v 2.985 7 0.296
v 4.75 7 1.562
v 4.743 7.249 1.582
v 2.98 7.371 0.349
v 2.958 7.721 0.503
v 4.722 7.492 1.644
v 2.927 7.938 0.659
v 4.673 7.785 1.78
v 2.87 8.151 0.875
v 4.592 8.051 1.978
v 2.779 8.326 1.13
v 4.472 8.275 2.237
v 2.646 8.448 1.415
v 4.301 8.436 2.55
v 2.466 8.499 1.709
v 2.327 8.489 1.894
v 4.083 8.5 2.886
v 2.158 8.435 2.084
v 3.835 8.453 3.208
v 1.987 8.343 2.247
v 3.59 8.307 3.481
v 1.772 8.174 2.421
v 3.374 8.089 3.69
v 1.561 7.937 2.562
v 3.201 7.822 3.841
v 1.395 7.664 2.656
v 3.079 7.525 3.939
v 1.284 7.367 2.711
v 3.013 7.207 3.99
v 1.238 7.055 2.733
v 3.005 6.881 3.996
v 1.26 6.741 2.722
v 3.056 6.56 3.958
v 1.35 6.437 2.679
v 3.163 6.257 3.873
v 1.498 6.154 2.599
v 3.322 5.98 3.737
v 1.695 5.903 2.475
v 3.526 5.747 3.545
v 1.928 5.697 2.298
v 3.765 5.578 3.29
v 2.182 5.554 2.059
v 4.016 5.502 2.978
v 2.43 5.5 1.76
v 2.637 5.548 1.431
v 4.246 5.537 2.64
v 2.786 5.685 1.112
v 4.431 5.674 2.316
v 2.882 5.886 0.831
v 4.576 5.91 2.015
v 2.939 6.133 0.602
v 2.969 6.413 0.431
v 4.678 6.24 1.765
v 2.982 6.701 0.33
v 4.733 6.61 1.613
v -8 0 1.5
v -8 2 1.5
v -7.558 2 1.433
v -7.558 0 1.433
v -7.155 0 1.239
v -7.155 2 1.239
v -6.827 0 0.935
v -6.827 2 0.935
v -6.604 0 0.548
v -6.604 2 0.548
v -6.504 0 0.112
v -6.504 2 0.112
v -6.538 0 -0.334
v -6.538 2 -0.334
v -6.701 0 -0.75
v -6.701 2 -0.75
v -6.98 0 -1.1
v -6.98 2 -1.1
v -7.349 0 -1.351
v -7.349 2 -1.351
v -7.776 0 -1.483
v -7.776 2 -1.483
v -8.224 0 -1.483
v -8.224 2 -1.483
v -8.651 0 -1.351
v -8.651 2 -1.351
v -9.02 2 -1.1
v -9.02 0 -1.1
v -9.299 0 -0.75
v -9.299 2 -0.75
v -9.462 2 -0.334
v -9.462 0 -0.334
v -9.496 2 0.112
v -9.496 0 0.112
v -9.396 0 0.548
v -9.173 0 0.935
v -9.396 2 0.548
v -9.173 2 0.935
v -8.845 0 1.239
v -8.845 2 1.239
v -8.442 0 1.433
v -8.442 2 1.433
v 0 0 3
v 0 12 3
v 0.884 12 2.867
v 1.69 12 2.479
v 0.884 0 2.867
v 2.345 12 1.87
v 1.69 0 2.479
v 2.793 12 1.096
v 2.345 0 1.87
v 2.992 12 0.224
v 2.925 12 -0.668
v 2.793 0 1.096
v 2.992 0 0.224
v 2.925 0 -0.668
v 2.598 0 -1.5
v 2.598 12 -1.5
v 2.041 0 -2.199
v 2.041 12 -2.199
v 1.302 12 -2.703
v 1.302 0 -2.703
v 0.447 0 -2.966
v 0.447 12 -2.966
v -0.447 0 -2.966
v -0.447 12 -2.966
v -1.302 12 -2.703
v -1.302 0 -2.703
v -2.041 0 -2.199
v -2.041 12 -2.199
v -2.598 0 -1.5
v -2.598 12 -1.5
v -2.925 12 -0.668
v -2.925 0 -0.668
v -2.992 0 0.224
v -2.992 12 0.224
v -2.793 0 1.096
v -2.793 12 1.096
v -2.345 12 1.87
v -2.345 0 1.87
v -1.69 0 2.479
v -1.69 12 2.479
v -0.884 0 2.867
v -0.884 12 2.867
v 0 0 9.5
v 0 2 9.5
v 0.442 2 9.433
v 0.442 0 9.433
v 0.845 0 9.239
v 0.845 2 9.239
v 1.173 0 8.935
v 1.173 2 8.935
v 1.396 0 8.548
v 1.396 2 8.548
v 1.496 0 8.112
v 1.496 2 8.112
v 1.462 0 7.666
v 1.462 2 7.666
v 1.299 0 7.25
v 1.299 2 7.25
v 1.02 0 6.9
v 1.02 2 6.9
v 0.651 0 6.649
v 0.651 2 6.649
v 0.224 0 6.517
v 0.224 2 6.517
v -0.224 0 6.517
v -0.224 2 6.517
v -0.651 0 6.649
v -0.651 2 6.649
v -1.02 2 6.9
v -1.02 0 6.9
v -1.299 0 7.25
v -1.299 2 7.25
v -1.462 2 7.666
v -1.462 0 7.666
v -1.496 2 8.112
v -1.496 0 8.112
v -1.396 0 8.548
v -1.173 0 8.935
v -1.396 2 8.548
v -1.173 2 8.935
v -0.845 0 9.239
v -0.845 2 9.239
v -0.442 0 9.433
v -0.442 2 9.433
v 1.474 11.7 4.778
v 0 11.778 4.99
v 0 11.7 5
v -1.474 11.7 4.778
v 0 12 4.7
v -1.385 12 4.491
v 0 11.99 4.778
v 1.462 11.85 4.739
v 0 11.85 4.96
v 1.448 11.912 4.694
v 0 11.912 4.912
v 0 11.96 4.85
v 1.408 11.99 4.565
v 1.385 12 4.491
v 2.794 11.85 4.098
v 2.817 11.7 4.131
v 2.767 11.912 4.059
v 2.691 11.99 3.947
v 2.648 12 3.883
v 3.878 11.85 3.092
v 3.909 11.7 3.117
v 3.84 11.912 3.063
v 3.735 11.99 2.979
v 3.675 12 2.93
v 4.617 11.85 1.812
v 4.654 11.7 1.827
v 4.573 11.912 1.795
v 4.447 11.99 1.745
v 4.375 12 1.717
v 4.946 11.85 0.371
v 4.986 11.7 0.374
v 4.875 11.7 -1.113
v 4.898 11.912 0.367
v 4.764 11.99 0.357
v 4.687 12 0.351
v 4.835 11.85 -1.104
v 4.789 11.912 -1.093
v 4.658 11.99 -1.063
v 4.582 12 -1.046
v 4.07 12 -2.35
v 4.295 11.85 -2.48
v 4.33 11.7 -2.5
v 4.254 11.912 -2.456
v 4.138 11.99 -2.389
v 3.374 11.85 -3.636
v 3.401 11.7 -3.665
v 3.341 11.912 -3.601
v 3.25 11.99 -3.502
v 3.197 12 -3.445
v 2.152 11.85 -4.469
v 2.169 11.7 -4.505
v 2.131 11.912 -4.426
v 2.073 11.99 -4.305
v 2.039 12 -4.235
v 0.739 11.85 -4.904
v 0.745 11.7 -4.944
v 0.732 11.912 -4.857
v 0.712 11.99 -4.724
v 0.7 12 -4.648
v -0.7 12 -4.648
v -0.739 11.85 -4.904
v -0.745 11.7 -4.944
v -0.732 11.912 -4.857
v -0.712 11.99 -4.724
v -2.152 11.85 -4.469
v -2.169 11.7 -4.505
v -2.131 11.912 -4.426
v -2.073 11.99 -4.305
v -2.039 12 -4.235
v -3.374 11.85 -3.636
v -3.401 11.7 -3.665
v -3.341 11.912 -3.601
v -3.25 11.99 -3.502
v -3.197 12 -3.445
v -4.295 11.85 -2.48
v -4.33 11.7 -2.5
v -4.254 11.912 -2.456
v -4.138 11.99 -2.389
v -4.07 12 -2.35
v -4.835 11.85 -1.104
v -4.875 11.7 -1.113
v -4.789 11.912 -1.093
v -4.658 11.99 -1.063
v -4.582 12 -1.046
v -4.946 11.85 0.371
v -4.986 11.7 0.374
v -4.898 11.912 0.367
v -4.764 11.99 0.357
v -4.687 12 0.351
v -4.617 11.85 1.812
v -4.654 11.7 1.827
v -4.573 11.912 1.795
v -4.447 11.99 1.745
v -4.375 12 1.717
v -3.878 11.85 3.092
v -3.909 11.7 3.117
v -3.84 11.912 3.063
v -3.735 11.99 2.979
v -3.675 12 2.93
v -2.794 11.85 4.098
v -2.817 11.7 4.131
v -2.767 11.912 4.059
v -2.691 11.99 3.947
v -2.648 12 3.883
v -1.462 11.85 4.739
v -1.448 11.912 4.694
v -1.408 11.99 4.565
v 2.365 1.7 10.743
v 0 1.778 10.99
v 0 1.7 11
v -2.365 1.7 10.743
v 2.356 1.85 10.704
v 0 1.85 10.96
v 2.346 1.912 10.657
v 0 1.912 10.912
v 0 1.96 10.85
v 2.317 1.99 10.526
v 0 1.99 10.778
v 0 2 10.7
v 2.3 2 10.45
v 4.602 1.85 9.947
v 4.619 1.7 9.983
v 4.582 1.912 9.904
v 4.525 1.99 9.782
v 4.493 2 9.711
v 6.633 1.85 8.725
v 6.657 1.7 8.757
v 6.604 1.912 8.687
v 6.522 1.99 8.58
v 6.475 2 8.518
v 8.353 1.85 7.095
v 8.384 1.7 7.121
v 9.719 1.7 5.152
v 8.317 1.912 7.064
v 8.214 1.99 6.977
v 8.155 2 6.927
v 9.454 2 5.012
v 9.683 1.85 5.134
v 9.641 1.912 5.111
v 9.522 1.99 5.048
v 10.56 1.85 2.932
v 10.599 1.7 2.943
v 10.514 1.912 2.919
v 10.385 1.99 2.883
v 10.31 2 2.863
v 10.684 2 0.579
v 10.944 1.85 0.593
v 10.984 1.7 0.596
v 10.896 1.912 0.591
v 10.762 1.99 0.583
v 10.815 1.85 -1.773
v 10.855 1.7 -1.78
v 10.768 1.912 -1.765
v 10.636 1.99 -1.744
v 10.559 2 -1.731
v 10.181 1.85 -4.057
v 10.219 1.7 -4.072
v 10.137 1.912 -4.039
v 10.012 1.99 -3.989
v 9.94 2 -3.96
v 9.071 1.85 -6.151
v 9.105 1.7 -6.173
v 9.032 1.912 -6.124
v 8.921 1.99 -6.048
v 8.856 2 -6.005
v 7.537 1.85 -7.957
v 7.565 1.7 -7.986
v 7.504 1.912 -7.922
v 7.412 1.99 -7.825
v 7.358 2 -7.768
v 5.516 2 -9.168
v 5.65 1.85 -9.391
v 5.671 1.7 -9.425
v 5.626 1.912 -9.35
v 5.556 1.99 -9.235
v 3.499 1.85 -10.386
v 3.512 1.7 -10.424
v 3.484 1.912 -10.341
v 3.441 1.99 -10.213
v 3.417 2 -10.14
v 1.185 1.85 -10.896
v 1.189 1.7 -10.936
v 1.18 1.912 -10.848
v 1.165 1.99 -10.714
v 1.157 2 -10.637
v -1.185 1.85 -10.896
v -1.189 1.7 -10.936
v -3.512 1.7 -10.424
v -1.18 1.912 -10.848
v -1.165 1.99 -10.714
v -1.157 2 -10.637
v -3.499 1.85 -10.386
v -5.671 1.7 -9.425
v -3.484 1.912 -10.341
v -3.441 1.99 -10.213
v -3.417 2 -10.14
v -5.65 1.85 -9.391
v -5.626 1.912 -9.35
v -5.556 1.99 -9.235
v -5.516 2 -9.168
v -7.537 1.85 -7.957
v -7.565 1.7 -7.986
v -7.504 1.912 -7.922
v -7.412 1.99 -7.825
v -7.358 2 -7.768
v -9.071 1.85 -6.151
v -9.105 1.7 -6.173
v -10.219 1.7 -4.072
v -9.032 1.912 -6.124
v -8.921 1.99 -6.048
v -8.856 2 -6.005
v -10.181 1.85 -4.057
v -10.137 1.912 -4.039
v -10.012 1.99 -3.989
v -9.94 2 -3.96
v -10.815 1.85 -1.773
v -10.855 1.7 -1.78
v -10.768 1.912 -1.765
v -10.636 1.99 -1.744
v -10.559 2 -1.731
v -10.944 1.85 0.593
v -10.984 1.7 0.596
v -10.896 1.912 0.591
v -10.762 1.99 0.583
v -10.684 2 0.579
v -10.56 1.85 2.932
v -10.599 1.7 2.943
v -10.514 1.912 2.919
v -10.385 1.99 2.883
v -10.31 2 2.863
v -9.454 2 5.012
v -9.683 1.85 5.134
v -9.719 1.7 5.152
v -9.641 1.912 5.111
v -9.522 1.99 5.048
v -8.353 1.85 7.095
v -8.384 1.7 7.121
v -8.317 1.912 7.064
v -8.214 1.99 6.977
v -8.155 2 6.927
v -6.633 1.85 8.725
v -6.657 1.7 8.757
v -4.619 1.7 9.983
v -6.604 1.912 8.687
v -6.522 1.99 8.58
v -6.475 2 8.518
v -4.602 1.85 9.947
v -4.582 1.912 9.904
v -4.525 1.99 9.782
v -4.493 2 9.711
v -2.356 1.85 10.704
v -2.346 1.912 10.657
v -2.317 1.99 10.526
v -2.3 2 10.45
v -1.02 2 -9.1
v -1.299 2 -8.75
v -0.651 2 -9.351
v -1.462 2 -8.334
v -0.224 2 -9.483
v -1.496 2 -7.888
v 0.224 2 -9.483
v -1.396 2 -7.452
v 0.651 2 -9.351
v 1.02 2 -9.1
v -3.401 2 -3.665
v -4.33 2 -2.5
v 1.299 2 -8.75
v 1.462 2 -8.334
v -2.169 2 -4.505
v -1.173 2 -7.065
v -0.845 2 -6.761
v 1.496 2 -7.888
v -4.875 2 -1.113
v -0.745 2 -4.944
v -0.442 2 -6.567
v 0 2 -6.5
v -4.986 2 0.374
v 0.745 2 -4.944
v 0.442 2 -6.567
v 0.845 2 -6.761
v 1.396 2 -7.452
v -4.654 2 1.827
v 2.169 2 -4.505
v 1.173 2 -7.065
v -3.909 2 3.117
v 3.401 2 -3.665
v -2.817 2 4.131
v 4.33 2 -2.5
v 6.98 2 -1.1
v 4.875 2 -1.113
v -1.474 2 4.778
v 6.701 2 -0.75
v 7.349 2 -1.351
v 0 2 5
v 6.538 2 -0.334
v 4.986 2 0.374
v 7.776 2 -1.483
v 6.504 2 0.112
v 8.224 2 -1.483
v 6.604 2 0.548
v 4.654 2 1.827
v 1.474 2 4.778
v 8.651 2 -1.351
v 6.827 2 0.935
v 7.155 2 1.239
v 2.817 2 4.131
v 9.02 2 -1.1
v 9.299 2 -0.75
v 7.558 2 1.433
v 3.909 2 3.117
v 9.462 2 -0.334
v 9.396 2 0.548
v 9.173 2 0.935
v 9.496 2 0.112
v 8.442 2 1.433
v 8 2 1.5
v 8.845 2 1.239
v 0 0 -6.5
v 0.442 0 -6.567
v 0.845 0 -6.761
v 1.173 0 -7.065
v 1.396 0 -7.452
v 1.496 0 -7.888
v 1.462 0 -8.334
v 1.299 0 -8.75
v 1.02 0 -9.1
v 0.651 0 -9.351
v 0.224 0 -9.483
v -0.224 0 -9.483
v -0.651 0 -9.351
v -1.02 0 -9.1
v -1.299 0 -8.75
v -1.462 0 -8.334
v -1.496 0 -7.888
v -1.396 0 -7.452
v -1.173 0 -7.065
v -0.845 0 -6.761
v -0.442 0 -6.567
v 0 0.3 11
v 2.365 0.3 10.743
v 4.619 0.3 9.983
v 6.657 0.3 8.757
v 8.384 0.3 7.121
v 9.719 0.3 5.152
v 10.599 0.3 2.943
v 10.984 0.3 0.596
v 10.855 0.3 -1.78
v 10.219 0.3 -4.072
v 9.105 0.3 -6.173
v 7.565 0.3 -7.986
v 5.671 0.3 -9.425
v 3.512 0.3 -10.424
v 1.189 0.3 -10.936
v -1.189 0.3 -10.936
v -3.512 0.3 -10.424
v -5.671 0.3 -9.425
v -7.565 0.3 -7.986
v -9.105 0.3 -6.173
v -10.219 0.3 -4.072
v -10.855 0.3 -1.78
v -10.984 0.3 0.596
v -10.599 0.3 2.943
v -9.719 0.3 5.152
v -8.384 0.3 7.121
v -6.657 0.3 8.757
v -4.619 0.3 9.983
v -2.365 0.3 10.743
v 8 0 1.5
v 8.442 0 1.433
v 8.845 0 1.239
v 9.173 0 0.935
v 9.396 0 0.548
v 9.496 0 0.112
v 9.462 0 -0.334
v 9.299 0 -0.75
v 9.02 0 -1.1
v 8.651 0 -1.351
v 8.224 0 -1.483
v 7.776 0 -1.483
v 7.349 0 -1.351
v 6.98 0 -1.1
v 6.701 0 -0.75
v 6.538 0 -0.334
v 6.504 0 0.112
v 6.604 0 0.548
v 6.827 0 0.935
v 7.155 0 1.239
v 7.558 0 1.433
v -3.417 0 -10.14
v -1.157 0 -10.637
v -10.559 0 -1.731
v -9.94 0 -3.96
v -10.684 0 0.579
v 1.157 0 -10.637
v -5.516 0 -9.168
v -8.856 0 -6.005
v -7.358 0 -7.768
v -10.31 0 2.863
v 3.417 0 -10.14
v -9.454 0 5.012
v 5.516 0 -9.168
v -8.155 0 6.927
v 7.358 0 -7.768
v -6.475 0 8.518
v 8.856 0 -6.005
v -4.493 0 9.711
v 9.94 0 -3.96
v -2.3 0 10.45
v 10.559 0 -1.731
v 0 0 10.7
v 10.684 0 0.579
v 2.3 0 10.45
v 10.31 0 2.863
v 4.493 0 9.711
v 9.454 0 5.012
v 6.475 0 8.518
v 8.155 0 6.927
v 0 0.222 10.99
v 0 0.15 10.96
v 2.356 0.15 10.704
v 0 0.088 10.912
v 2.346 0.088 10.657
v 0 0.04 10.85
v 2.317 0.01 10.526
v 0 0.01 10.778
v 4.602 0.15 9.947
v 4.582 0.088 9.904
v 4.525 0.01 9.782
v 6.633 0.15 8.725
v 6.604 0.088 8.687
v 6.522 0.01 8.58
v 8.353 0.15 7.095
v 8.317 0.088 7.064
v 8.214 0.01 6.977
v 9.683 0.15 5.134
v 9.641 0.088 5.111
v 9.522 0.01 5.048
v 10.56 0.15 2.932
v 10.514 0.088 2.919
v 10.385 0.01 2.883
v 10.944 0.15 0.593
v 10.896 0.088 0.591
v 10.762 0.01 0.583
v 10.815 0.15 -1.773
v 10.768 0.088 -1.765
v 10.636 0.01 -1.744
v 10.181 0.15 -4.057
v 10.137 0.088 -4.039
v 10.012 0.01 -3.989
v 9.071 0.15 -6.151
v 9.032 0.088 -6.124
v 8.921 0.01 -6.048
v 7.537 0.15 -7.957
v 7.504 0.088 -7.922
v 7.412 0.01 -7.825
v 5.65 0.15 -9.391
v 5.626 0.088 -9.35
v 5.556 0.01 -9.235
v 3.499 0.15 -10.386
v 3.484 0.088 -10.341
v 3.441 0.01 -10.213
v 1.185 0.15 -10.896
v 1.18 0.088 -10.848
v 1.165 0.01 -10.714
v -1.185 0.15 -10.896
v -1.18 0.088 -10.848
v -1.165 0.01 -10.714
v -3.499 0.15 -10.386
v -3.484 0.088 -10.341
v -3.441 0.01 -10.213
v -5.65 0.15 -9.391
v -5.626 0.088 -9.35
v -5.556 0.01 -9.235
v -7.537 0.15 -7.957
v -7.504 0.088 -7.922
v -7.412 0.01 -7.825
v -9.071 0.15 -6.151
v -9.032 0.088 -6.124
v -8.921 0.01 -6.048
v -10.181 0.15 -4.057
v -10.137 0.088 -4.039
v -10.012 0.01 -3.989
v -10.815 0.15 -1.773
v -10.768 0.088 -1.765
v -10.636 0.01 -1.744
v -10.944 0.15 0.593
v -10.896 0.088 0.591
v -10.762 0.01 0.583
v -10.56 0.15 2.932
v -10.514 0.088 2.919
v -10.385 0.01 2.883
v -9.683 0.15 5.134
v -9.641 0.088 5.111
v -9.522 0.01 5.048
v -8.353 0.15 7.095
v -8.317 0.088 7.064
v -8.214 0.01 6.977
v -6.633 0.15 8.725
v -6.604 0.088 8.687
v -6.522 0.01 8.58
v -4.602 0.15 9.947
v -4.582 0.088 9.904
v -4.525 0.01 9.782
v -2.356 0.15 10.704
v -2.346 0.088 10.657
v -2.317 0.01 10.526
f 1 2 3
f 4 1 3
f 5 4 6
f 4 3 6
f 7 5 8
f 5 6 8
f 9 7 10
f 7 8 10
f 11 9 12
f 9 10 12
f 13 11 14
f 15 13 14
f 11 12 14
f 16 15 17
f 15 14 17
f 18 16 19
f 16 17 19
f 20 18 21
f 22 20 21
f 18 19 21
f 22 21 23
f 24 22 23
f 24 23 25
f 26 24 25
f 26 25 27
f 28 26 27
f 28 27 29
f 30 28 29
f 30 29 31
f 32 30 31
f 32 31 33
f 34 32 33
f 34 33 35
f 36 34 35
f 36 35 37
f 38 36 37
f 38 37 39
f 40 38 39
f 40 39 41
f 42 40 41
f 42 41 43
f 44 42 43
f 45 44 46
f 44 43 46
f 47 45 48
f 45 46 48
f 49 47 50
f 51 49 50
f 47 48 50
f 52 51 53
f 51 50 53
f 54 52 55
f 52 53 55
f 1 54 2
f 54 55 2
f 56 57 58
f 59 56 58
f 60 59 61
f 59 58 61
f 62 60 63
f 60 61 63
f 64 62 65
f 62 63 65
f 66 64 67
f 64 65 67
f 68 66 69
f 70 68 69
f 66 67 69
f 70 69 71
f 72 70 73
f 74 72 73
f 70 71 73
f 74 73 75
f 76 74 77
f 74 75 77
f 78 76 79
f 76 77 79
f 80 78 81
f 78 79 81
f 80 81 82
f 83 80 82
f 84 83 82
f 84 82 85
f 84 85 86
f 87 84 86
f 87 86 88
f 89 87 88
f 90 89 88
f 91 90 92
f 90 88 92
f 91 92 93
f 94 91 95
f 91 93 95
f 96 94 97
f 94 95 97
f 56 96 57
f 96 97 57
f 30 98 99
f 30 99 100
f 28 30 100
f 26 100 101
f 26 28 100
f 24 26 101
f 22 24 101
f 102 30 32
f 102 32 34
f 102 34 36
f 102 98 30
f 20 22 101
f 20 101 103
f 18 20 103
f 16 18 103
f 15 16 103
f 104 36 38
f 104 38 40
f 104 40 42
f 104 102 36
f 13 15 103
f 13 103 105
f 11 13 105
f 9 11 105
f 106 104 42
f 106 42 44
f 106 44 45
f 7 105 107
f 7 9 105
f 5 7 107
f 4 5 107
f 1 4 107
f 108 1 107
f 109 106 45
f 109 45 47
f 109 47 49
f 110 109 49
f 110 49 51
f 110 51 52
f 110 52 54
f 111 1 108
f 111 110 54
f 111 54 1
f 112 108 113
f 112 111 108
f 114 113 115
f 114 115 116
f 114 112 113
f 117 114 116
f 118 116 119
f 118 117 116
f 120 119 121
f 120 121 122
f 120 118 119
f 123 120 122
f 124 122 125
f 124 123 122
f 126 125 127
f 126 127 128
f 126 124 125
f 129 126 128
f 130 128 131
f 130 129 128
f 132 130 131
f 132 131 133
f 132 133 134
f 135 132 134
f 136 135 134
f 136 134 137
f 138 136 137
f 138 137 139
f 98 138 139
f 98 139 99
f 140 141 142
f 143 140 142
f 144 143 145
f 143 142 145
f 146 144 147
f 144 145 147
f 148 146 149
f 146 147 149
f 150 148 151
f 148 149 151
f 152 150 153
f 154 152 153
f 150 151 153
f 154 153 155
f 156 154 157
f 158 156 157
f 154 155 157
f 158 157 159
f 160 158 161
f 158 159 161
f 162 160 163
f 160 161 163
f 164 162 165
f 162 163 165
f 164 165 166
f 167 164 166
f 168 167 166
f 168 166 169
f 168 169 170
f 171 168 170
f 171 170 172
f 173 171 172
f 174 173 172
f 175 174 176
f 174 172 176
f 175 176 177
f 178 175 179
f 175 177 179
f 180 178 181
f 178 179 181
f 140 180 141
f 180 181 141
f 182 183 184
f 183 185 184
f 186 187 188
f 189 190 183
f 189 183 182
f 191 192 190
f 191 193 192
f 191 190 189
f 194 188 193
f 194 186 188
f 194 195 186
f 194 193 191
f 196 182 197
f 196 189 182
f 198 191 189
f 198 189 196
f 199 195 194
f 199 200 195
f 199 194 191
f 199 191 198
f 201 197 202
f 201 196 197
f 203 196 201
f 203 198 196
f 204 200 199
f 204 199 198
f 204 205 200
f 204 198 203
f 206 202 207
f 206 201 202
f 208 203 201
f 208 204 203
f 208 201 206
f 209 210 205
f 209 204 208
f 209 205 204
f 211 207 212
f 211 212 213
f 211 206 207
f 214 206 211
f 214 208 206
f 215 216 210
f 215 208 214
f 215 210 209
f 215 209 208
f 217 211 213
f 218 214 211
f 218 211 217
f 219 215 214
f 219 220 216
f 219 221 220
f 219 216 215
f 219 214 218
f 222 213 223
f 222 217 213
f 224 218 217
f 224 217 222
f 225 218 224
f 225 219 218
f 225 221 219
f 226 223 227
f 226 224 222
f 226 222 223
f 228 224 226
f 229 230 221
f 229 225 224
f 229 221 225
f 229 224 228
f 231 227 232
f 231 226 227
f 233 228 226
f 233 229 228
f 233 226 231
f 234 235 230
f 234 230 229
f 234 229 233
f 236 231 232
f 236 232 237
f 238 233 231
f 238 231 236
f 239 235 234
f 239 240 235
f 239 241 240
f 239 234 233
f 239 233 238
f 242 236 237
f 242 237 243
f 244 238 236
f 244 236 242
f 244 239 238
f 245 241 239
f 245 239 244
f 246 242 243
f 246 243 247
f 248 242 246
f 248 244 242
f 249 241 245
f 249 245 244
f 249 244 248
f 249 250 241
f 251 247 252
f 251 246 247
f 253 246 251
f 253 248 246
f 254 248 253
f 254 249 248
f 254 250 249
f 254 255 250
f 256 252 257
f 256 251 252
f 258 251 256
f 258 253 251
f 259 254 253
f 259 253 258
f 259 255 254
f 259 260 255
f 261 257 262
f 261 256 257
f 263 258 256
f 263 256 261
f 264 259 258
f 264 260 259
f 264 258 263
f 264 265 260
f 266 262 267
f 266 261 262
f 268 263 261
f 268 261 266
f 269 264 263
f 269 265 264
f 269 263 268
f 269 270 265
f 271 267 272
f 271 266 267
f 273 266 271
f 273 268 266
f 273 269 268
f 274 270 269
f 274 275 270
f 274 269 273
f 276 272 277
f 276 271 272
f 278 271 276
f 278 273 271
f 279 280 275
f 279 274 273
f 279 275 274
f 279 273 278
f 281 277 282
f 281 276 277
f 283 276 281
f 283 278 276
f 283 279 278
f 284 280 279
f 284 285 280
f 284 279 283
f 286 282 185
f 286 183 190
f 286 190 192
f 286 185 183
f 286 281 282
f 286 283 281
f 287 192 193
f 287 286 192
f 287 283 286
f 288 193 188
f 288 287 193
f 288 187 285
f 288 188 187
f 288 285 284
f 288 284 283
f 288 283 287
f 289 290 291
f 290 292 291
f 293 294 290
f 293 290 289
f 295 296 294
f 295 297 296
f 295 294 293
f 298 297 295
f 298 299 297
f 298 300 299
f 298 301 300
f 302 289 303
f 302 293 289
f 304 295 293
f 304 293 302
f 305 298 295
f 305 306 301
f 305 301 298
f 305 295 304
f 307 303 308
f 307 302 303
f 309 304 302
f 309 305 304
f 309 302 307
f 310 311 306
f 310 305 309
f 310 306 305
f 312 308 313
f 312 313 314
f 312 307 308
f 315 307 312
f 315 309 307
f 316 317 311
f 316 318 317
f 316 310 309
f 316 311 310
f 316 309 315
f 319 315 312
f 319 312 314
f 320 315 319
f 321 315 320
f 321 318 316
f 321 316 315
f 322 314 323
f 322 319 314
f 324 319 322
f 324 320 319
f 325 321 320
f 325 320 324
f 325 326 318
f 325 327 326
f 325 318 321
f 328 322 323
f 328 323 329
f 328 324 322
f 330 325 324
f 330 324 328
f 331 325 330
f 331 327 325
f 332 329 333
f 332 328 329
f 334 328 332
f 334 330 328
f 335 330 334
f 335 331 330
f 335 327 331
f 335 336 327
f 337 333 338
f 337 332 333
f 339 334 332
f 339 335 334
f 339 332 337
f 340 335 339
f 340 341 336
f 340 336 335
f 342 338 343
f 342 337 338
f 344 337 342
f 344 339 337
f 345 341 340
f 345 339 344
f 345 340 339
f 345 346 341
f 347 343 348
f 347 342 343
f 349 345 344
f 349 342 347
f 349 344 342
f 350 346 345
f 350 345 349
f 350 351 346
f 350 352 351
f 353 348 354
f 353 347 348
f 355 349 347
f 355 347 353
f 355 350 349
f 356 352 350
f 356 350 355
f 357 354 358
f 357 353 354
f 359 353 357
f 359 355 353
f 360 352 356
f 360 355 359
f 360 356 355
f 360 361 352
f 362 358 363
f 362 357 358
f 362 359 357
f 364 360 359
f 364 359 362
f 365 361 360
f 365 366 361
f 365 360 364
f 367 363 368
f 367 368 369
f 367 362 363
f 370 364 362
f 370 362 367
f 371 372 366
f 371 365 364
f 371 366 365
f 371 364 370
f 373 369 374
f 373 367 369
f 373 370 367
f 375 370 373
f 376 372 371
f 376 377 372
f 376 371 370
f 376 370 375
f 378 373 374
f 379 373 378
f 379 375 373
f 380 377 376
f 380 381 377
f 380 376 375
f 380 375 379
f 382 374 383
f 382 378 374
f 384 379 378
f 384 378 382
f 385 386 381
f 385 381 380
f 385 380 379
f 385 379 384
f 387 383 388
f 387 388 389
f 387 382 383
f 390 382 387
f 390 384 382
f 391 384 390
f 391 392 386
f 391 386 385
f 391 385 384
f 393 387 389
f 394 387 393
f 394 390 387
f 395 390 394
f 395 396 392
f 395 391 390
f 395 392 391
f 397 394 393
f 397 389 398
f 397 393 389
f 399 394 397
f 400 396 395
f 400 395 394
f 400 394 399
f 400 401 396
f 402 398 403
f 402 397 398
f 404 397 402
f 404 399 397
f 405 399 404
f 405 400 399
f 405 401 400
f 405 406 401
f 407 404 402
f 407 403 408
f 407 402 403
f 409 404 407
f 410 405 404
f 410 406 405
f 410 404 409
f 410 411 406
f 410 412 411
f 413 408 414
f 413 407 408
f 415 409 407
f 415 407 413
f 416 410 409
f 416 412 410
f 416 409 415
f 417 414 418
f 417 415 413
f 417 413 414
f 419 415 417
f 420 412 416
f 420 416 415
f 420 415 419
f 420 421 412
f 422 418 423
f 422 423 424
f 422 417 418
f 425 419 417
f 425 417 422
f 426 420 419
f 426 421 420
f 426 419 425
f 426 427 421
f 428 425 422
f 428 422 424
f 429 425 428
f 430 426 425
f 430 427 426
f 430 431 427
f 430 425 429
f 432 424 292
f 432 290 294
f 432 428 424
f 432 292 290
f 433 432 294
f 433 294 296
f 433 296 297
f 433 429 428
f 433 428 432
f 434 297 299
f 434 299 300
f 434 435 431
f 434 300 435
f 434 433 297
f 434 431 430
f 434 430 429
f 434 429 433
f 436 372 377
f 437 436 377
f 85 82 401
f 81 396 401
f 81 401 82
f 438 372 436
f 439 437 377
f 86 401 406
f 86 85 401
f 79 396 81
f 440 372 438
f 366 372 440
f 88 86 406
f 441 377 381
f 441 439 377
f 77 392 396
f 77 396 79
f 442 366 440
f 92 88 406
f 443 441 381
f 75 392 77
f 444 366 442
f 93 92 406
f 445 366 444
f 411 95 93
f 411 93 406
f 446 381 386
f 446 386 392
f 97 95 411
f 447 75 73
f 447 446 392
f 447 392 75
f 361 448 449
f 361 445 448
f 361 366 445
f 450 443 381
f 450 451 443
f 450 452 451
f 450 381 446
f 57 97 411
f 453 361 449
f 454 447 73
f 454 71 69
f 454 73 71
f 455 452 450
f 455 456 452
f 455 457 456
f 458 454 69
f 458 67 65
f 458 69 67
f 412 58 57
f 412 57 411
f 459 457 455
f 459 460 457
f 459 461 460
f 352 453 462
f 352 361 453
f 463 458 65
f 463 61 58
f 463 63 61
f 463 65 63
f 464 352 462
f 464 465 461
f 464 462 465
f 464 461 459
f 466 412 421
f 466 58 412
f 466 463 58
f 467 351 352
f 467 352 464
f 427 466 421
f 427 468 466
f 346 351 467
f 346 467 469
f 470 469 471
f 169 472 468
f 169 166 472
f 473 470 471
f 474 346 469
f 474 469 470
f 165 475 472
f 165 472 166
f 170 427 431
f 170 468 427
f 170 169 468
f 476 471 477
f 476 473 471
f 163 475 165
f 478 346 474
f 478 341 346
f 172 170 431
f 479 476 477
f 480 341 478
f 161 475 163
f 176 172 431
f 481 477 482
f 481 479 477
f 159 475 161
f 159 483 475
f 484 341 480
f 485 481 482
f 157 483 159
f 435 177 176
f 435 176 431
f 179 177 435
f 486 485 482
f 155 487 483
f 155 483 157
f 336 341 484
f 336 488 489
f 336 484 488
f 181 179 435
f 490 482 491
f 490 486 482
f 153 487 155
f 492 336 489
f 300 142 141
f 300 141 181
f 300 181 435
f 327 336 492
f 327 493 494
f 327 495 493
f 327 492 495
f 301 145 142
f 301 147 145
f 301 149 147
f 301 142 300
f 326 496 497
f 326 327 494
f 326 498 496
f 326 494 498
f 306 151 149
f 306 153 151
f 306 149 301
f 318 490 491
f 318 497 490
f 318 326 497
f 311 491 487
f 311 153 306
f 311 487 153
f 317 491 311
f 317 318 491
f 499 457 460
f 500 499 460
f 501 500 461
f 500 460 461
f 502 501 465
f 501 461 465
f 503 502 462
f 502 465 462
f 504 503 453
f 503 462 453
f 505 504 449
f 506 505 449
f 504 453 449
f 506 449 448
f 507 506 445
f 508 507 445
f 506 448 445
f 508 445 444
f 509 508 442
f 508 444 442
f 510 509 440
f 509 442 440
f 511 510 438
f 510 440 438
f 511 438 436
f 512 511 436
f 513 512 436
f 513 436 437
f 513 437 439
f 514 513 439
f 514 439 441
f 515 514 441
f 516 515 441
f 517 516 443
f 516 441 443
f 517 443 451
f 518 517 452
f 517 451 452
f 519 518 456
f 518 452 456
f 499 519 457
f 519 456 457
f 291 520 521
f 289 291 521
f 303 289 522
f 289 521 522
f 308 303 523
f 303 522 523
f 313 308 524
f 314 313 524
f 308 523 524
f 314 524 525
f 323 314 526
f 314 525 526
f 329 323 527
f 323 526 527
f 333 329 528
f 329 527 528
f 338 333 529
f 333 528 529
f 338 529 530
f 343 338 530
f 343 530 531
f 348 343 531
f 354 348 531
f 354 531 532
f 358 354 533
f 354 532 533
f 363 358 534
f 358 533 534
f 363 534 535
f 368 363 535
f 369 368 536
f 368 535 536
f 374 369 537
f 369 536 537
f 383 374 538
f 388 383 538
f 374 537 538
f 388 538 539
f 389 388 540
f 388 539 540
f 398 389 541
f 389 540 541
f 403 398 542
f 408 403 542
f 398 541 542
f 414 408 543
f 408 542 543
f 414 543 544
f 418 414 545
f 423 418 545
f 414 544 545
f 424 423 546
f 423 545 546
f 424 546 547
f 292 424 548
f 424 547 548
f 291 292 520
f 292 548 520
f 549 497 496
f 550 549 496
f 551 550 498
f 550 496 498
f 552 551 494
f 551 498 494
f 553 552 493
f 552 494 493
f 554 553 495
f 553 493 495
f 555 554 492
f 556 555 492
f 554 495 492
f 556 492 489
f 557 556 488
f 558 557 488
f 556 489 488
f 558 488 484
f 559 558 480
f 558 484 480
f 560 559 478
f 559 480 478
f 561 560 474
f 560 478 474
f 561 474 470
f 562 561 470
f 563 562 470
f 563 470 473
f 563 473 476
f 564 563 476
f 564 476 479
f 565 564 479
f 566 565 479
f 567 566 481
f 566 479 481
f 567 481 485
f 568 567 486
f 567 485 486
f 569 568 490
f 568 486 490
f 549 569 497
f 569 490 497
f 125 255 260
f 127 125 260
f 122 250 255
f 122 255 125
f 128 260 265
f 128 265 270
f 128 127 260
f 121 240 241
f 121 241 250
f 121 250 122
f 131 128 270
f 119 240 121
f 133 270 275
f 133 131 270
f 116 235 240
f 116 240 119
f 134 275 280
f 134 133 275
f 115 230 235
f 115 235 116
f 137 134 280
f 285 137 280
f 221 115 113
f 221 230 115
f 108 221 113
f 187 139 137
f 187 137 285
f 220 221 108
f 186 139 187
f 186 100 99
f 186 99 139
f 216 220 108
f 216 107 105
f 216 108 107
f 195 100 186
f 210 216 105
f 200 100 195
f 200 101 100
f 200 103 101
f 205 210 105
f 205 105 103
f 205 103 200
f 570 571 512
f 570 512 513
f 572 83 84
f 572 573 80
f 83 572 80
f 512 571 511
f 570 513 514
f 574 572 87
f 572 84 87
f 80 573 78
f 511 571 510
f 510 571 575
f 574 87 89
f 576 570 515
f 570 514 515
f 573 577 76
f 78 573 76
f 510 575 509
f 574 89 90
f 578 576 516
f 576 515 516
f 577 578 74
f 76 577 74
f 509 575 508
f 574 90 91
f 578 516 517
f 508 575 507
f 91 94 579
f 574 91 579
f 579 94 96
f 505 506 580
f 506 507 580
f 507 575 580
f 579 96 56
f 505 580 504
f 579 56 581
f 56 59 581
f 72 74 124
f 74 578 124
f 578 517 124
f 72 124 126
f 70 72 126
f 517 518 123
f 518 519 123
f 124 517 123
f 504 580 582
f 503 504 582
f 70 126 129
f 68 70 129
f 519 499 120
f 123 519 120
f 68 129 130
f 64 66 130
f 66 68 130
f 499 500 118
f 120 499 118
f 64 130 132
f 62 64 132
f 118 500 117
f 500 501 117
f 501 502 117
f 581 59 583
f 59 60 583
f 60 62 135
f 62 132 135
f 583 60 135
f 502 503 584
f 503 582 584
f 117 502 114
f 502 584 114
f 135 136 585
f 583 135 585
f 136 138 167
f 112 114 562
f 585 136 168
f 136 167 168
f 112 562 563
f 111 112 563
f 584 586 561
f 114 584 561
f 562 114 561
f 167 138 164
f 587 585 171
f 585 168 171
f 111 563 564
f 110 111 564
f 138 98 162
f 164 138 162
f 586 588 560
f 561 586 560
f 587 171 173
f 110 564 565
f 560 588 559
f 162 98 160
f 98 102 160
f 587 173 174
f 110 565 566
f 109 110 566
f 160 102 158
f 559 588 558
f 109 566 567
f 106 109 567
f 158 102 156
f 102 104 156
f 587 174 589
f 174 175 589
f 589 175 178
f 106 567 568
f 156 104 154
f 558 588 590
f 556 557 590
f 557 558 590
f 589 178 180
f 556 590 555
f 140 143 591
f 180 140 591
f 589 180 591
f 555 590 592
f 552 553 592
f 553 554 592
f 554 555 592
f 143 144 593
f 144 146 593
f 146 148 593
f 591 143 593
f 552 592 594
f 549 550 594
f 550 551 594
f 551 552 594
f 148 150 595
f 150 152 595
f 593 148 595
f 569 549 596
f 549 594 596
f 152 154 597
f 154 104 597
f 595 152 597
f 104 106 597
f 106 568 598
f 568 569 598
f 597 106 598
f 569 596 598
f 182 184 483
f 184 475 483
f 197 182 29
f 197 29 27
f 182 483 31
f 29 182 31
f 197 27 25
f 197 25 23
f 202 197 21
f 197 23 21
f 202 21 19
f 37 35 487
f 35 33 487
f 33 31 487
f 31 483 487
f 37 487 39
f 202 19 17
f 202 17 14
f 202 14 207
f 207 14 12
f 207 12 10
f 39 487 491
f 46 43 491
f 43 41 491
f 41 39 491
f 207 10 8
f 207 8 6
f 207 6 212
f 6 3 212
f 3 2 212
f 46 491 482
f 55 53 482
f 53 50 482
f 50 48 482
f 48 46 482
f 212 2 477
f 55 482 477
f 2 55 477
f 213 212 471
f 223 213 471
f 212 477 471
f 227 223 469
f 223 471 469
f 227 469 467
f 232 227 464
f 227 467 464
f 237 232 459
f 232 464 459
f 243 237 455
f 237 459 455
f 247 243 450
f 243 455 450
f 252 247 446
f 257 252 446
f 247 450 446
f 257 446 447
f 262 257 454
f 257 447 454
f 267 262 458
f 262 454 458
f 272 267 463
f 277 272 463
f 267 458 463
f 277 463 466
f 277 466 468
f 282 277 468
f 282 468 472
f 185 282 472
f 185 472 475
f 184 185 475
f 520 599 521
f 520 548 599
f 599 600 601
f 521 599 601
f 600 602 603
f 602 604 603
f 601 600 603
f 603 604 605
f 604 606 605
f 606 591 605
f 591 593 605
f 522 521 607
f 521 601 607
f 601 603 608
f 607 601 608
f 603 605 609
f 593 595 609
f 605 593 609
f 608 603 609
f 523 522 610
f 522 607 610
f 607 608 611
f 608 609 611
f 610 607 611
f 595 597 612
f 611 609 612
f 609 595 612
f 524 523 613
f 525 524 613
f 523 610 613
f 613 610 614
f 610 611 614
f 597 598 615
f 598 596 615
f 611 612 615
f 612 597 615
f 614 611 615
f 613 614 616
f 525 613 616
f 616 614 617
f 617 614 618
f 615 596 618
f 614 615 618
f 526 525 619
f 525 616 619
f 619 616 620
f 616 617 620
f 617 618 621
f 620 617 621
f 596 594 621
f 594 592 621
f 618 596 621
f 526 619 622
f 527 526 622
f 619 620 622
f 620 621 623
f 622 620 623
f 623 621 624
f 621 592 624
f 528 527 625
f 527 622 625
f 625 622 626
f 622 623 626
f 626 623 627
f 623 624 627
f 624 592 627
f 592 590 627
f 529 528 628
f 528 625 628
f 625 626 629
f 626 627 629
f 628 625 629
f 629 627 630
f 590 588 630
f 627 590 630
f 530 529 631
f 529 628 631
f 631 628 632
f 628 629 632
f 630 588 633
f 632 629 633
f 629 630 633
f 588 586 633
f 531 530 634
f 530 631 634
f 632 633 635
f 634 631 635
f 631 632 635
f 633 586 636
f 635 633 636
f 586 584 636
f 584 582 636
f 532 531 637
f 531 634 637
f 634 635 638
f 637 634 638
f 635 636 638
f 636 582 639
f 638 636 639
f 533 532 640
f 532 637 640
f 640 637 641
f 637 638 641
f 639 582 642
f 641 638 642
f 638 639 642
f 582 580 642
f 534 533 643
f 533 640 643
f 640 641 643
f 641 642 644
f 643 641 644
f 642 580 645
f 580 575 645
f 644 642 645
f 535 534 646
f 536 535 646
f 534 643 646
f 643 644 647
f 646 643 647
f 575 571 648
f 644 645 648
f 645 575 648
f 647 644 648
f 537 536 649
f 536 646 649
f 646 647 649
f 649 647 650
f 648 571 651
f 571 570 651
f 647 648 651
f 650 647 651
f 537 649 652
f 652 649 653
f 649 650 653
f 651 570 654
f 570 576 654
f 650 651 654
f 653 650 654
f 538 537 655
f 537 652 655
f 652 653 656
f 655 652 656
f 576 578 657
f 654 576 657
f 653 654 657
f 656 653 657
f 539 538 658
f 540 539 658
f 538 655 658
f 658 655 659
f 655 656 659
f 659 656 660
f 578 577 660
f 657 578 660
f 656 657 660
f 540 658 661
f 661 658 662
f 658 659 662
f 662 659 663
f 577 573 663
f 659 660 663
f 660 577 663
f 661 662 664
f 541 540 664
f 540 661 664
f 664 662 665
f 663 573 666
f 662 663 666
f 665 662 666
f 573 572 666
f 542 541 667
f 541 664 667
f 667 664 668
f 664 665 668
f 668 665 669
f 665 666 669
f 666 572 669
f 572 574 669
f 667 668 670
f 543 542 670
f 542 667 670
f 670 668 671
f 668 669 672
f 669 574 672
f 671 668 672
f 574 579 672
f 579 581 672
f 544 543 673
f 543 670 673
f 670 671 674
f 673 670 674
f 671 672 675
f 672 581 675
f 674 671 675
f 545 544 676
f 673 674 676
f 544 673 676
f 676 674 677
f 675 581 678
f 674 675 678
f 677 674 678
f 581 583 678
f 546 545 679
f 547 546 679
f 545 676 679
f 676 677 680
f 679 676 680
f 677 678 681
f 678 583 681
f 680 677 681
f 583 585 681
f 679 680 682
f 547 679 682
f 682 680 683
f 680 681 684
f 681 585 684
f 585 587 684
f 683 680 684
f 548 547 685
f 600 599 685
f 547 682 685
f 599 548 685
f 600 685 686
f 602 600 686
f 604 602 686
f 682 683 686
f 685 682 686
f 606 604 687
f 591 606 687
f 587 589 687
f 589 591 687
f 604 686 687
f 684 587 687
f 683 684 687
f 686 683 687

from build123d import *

# Parameters (mm, degrees)
SKETCH1_R           = 5
BOSS_EXTRUDE2_DEPTH = 12
SKETCH3_R           = 11
BOSS_EXTRUDE3_DEPTH = 2
SKETCH4_R           = 3
CUT_EXTRUDE1_DEPTH  = 12
SKETCH5_R           = 1.5
CUT_EXTRUDE2_DEPTH  = 2
FILLET1_R           = 0.3
SKETCH7_R           = 1.5
CUT_EXTRUDE3_DEPTH  = 4


with BuildPart() as part:
    # Sketch1 → Boss-Extrude2 (new body)
    with BuildSketch(Plane(origin=(0, 0, 0), x_dir=(1, 0, 0), z_dir=(0, 1, 0))):
        with Locations(Location((0, 0, 0), (0, 0, 270))):
            Circle(SKETCH1_R)
    extrude(amount=BOSS_EXTRUDE2_DEPTH)

    # Sketch3 → Boss-Extrude3 (add)
    with BuildSketch(Plane(origin=(0, 0, 0), x_dir=(1, 0, 0), z_dir=(0, 1, 0))):
        with Locations(Location((0, 0, 0), (0, 0, 270))):
            Circle(SKETCH3_R)
    extrude(amount=BOSS_EXTRUDE3_DEPTH)

    # Sketch4 → Cut-Extrude1 (cut)
    with BuildSketch(Plane(origin=(0, 0, 0), x_dir=(1, 0, 0), z_dir=(0, 1, 0))):
        with Locations(Location((0, 0, 0), (0, 0, 270))):
            Circle(SKETCH4_R)
    extrude(amount=CUT_EXTRUDE1_DEPTH, mode=Mode.SUBTRACT)

    # Sketch5 → Cut-Extrude2 (cut)
    with BuildSketch(Plane(origin=(0, 2, 0), x_dir=(1, 0, 0), z_dir=(0, 1, 0))):
        with Locations(Location((0, 8, 0), (0, 0, 270))):
            Circle(SKETCH5_R)
        with Locations(Location((8, 0, 0), (0, 0, 270))):
            Circle(SKETCH5_R)
        with Locations(Location((0, -8, 0), (0, 0, 270))):
            Circle(SKETCH5_R)
        with Locations(Location((-8, 0, 0), (0, 0, 270))):
            Circle(SKETCH5_R)
    extrude(amount=-CUT_EXTRUDE2_DEPTH, mode=Mode.SUBTRACT)

    # Fillet1
    fillet1_edges = [part.edges().sort_by_distance(p)[0] for p in [
        (0, 12, -5),
        (0, 0, -11),
        (0, 2, -11),
    ]]
    fillet(fillet1_edges, radius=FILLET1_R)

    # Sketch7 → Cut-Extrude3 (cut)
    with BuildSketch(Plane(origin=(4.0625, 0, 2.914805954), x_dir=(0.5829611908180293, 0, -0.8125000000000155), z_dir=(0.8125000000000155, 0, 0.5829611908180293))):
        with Locations((0, 7)):
            Circle(SKETCH7_R)
    extrude(amount=-CUT_EXTRUDE3_DEPTH, mode=Mode.SUBTRACT)


solid = part.part
